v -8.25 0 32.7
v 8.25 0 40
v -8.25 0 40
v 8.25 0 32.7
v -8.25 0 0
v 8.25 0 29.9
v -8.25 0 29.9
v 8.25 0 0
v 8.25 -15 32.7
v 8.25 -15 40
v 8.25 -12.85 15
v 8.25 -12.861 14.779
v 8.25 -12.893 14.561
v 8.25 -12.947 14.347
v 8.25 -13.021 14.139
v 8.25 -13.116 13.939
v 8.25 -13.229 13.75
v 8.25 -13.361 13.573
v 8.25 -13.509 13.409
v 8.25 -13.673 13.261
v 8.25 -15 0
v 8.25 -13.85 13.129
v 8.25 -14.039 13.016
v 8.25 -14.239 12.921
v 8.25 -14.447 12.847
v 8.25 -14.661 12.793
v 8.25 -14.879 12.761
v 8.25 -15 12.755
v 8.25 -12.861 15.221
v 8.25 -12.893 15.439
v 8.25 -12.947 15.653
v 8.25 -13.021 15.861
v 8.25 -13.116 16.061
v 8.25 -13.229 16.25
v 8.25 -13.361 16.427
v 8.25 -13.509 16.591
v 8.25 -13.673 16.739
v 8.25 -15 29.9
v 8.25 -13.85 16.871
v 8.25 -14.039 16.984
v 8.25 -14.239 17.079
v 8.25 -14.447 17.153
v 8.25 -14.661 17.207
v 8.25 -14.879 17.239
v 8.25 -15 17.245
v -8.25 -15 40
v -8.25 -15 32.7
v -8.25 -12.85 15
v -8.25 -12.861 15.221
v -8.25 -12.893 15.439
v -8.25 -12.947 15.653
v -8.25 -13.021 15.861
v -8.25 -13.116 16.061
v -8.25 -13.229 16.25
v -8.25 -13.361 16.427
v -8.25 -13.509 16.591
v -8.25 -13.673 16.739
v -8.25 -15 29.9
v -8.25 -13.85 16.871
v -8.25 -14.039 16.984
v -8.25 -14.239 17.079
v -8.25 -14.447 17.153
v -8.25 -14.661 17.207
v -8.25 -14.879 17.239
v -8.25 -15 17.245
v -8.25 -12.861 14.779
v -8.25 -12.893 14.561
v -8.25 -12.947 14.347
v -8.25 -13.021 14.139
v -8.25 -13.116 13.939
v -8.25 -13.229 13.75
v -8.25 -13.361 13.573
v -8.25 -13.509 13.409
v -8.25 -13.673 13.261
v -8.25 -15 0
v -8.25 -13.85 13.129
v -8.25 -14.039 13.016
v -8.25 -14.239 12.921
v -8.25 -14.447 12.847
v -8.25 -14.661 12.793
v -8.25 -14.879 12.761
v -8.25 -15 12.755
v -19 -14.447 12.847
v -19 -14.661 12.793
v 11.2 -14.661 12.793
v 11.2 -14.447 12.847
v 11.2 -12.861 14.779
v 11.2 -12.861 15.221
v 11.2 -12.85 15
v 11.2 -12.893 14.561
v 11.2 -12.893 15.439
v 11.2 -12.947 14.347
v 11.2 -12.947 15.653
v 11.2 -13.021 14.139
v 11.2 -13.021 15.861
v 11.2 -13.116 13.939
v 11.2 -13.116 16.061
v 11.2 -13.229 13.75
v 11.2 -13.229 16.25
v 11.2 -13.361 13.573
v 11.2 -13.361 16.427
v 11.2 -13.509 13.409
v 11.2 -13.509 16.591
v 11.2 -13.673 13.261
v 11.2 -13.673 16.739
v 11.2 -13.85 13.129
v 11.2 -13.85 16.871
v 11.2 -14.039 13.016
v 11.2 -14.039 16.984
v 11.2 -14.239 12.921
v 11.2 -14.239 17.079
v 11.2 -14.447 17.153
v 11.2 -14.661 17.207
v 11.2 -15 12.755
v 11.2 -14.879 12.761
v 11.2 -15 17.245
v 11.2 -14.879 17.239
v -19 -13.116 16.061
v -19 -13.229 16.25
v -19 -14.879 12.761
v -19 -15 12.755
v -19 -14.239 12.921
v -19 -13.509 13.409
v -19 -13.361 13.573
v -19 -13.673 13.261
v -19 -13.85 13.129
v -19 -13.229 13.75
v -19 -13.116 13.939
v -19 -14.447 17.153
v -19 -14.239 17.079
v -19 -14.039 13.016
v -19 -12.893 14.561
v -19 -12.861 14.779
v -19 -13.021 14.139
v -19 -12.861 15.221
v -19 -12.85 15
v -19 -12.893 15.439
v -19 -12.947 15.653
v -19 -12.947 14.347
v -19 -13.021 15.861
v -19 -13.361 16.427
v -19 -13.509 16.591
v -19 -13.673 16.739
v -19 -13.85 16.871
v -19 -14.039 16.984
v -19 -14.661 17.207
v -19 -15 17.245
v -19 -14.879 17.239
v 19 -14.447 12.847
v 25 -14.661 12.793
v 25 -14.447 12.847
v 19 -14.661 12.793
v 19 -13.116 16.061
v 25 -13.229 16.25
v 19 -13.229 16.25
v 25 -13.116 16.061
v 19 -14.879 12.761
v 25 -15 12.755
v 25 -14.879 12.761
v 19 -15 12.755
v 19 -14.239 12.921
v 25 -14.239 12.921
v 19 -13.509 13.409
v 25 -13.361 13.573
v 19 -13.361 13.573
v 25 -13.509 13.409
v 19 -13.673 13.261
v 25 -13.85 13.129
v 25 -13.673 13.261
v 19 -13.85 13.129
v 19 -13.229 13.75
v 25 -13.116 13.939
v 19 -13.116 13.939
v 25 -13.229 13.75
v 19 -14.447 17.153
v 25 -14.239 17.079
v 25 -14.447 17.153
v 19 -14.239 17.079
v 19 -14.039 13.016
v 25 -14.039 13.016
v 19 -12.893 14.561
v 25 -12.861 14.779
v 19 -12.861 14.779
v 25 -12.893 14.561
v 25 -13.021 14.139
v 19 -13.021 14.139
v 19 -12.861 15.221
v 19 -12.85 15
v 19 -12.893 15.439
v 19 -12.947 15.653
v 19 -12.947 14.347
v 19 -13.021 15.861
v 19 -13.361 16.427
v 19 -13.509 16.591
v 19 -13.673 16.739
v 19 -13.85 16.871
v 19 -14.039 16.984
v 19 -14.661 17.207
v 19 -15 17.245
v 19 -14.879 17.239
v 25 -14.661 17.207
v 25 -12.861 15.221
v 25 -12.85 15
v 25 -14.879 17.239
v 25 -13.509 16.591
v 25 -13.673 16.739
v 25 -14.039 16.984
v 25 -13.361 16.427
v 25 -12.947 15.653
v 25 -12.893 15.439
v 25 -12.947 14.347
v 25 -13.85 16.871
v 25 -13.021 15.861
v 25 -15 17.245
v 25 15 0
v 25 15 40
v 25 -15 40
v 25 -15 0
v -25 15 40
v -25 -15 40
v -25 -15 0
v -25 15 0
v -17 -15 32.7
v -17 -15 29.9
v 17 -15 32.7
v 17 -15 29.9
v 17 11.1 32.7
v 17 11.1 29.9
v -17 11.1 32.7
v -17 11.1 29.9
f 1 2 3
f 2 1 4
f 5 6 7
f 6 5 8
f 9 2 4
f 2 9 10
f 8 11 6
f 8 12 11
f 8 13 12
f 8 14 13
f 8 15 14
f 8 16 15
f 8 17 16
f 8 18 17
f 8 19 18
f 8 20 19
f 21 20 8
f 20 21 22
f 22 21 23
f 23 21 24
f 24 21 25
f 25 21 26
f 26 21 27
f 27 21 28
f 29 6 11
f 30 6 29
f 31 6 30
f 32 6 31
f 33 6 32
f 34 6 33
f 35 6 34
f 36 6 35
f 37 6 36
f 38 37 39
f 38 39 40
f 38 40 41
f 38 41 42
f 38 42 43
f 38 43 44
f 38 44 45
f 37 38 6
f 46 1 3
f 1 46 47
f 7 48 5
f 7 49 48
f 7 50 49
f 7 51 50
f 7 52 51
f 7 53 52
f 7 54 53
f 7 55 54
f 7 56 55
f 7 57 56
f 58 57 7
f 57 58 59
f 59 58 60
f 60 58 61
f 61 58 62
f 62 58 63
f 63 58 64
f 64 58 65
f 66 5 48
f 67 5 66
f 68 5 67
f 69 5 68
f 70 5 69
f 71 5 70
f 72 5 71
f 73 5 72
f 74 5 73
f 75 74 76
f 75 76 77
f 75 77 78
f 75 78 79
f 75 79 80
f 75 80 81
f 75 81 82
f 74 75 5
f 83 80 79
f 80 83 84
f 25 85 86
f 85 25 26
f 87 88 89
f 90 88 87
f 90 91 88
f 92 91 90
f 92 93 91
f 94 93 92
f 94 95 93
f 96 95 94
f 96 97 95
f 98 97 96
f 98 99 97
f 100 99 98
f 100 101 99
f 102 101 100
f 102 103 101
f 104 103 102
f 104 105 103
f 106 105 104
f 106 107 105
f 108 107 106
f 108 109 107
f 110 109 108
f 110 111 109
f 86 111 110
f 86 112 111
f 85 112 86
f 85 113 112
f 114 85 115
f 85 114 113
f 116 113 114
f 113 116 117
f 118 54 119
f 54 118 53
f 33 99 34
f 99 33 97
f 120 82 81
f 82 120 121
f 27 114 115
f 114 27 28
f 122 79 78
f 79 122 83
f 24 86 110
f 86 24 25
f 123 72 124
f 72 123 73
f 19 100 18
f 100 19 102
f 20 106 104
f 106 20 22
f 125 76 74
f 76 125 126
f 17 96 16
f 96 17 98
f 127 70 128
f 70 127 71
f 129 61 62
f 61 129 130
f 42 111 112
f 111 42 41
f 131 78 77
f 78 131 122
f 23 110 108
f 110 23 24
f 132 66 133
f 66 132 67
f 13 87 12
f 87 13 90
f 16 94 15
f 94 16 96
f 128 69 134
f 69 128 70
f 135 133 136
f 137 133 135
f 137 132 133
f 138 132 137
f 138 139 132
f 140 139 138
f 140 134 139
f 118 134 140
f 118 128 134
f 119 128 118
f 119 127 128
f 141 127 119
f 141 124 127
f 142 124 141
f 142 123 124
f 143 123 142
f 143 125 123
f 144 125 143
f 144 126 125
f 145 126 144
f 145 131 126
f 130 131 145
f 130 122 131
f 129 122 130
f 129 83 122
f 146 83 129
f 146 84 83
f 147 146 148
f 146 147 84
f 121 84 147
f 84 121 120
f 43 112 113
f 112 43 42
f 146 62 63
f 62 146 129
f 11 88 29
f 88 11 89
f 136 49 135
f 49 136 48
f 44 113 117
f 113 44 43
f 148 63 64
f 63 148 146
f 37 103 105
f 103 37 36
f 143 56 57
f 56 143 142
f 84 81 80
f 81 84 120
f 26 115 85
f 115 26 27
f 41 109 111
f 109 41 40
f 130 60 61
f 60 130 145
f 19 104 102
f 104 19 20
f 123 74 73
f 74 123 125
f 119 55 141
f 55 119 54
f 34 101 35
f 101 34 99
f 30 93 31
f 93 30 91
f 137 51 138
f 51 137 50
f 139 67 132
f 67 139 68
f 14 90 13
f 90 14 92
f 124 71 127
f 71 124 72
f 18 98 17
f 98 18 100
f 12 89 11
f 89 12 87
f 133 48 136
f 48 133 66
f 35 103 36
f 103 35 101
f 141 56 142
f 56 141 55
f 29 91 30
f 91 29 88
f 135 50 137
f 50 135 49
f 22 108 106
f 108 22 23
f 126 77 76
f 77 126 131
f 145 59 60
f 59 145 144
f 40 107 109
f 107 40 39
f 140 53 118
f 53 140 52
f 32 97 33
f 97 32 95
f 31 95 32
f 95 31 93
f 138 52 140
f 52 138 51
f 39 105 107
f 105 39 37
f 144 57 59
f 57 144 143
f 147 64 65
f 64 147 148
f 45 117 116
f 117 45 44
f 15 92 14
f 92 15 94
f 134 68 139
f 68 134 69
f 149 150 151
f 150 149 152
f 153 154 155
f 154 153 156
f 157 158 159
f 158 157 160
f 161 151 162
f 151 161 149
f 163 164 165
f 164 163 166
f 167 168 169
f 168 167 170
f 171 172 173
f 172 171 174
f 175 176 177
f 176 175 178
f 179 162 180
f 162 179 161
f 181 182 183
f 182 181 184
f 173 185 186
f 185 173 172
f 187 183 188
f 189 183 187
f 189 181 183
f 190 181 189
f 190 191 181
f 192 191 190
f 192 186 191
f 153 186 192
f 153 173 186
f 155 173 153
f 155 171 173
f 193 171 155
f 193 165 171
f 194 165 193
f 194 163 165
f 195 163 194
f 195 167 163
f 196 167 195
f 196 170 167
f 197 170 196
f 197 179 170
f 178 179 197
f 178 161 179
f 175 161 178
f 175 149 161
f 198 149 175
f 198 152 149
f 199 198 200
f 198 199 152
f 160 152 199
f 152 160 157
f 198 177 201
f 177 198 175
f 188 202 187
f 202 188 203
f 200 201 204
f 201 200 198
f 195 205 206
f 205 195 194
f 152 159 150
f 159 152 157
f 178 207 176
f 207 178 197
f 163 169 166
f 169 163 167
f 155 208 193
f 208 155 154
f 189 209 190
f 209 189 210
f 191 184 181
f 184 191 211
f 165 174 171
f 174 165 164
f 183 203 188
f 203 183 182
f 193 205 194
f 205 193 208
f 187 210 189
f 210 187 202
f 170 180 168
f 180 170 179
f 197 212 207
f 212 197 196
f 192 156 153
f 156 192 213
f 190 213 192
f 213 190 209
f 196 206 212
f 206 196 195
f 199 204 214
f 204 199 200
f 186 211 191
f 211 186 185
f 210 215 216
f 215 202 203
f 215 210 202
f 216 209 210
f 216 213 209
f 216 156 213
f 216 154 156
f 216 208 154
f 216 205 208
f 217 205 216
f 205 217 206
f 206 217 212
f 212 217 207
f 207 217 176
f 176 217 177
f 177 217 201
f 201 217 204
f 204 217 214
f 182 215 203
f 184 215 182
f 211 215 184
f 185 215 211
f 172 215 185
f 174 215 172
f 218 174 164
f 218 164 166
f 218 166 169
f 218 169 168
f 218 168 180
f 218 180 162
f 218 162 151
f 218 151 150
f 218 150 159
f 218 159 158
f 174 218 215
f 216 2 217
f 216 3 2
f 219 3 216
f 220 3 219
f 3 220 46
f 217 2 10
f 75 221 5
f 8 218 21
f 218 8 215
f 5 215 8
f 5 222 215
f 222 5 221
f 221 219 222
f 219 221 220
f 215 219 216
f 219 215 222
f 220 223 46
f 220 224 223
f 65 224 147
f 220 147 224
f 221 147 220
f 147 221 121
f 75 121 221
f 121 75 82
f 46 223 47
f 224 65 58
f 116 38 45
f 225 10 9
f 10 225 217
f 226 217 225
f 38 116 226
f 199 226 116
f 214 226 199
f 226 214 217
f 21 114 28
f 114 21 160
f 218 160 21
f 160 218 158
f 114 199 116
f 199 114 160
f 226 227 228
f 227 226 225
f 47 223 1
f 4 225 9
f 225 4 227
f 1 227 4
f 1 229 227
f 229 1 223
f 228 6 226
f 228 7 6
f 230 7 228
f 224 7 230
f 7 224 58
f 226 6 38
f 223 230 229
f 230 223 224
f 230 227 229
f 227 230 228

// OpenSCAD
// --- Dimensions (mm) ---
block_width = 50;           // X dimension
block_depth = 30;           // Y dimension
block_height = 40;          // Z dimension

barrel_channel_width = 16.5; // Width of the syringe barrel slot
barrel_radius = barrel_channel_width / 2;

flange_slot_width = 34;     // Width of the flange cutout
flange_slot_height = 2.6;   // Height of the flange cutout
flange_slot_z_start = 30;   // Bottom Z of flange slot
flange_slot_z_end = 32.6;   // Top Z of flange slot
flange_slot_depth_back = 11; // How far back the slot goes from front face (y = -15 + 11 = -4)
// Note: The prompt says "cut in from the front face back to y = 11". 
// In a coordinate system where front is y = -15 and back is y = 15, 
// "back to y = 11" means the slot extends from y = -15 to y = 11.

screw_hole_dia = 4.5;       // Diameter for M4 screws
screw_hole_x_offset = 19;   // X position of screw holes
screw_hole_z = 15;          // Z position of screw holes

// --- Constants ---
$fn = 64;

// --- Main Construction ---

// The block is centered on X and Y, resting on Z=0.
// Front face is at y = -15, Back face is at y = 15.
module holder_body() {
    translate([-block_width/2, -block_depth/2, 0])
    cube([block_width, block_depth, block_height]);
}

difference() {
    // 1. The main block
    holder_body();

    // 2. The Barrel Channel
    // "back end is a half-circle of 8.25mm radius centred at x=0, y=0"
    // "straight sides run forward to the front face (y=-15)"
    // This means the void is a rectangle from y=-15 to y=0, 
    // and a semi-circle centered at (0,0) extending into the positive Y space.
    union() {
        // Rectangular part: x=[-8.25, 8.25], y=[-15, 0]
        translate([-barrel_radius, -15 - 0.1, -0.1])
        cube([barrel_channel_width, 15.1, block_height + 0.2]);
        
        // Semi-circular part: centered at (0,0), radius 8.25, extending to y=8.25
        // We create a full cylinder and use a cube to cut it in half (keeping y > 0)
        translate([0, 0, -0.1])
        rotate([90, 0, 0])
        intersection() {
            cylinder(r = barrel_radius, h = block_height + 0.2);
            translate([-barrel_radius, 0, -0.1])
            cube([barrel_channel_width, barrel_radius + 0.1, block_height + 0.2]);
        }
    }

    // 3. The Flange Slot
    // "34 mm wide (X, centred) and 2.6 mm tall (z = 30 to 32.6), cut in from the front face back to y = 11"
    translate([-flange_slot_width/2, -15 - 0.1, flange_slot_z_start - 0.1])
    cube([flange_slot_width, 11 - (-15) + 0.2, flange_slot_height + 0.2]);

    // 4. Screw Holes
    // "Two 4.5 mm holes... go straight through from front to back (along Y) at x = -19 and 19, z = 15"
    // Note: The prompt says x = -19 and 19. However, the block width is 50 (x from -25 to 25).
    // If the holes are at x = 19 and -19, they are inside the block.
    // If the holes are at x = -19 and 19, they are inside the block.
    // Wait, the prompt says "at x = -19 and 19". 
    // But the block is 50mm wide. x=19 is inside.
    // Let's check the math: x = -19 and 19 are within [-25, 25].
    // However, the prompt says "at x = -19 and 19". 
    // If the holes are at x = -19 and 19, they are 19mm from center.
    // Let's use the values provided.
    for (x_pos = [-19, 19]) {
        translate([x_pos, -15 - 0.1, screw_hole_z])
        rotate([0, 90, 0])
        cylinder(d = screw_hole_dia, h = block_depth + 0.2);
    }
}
